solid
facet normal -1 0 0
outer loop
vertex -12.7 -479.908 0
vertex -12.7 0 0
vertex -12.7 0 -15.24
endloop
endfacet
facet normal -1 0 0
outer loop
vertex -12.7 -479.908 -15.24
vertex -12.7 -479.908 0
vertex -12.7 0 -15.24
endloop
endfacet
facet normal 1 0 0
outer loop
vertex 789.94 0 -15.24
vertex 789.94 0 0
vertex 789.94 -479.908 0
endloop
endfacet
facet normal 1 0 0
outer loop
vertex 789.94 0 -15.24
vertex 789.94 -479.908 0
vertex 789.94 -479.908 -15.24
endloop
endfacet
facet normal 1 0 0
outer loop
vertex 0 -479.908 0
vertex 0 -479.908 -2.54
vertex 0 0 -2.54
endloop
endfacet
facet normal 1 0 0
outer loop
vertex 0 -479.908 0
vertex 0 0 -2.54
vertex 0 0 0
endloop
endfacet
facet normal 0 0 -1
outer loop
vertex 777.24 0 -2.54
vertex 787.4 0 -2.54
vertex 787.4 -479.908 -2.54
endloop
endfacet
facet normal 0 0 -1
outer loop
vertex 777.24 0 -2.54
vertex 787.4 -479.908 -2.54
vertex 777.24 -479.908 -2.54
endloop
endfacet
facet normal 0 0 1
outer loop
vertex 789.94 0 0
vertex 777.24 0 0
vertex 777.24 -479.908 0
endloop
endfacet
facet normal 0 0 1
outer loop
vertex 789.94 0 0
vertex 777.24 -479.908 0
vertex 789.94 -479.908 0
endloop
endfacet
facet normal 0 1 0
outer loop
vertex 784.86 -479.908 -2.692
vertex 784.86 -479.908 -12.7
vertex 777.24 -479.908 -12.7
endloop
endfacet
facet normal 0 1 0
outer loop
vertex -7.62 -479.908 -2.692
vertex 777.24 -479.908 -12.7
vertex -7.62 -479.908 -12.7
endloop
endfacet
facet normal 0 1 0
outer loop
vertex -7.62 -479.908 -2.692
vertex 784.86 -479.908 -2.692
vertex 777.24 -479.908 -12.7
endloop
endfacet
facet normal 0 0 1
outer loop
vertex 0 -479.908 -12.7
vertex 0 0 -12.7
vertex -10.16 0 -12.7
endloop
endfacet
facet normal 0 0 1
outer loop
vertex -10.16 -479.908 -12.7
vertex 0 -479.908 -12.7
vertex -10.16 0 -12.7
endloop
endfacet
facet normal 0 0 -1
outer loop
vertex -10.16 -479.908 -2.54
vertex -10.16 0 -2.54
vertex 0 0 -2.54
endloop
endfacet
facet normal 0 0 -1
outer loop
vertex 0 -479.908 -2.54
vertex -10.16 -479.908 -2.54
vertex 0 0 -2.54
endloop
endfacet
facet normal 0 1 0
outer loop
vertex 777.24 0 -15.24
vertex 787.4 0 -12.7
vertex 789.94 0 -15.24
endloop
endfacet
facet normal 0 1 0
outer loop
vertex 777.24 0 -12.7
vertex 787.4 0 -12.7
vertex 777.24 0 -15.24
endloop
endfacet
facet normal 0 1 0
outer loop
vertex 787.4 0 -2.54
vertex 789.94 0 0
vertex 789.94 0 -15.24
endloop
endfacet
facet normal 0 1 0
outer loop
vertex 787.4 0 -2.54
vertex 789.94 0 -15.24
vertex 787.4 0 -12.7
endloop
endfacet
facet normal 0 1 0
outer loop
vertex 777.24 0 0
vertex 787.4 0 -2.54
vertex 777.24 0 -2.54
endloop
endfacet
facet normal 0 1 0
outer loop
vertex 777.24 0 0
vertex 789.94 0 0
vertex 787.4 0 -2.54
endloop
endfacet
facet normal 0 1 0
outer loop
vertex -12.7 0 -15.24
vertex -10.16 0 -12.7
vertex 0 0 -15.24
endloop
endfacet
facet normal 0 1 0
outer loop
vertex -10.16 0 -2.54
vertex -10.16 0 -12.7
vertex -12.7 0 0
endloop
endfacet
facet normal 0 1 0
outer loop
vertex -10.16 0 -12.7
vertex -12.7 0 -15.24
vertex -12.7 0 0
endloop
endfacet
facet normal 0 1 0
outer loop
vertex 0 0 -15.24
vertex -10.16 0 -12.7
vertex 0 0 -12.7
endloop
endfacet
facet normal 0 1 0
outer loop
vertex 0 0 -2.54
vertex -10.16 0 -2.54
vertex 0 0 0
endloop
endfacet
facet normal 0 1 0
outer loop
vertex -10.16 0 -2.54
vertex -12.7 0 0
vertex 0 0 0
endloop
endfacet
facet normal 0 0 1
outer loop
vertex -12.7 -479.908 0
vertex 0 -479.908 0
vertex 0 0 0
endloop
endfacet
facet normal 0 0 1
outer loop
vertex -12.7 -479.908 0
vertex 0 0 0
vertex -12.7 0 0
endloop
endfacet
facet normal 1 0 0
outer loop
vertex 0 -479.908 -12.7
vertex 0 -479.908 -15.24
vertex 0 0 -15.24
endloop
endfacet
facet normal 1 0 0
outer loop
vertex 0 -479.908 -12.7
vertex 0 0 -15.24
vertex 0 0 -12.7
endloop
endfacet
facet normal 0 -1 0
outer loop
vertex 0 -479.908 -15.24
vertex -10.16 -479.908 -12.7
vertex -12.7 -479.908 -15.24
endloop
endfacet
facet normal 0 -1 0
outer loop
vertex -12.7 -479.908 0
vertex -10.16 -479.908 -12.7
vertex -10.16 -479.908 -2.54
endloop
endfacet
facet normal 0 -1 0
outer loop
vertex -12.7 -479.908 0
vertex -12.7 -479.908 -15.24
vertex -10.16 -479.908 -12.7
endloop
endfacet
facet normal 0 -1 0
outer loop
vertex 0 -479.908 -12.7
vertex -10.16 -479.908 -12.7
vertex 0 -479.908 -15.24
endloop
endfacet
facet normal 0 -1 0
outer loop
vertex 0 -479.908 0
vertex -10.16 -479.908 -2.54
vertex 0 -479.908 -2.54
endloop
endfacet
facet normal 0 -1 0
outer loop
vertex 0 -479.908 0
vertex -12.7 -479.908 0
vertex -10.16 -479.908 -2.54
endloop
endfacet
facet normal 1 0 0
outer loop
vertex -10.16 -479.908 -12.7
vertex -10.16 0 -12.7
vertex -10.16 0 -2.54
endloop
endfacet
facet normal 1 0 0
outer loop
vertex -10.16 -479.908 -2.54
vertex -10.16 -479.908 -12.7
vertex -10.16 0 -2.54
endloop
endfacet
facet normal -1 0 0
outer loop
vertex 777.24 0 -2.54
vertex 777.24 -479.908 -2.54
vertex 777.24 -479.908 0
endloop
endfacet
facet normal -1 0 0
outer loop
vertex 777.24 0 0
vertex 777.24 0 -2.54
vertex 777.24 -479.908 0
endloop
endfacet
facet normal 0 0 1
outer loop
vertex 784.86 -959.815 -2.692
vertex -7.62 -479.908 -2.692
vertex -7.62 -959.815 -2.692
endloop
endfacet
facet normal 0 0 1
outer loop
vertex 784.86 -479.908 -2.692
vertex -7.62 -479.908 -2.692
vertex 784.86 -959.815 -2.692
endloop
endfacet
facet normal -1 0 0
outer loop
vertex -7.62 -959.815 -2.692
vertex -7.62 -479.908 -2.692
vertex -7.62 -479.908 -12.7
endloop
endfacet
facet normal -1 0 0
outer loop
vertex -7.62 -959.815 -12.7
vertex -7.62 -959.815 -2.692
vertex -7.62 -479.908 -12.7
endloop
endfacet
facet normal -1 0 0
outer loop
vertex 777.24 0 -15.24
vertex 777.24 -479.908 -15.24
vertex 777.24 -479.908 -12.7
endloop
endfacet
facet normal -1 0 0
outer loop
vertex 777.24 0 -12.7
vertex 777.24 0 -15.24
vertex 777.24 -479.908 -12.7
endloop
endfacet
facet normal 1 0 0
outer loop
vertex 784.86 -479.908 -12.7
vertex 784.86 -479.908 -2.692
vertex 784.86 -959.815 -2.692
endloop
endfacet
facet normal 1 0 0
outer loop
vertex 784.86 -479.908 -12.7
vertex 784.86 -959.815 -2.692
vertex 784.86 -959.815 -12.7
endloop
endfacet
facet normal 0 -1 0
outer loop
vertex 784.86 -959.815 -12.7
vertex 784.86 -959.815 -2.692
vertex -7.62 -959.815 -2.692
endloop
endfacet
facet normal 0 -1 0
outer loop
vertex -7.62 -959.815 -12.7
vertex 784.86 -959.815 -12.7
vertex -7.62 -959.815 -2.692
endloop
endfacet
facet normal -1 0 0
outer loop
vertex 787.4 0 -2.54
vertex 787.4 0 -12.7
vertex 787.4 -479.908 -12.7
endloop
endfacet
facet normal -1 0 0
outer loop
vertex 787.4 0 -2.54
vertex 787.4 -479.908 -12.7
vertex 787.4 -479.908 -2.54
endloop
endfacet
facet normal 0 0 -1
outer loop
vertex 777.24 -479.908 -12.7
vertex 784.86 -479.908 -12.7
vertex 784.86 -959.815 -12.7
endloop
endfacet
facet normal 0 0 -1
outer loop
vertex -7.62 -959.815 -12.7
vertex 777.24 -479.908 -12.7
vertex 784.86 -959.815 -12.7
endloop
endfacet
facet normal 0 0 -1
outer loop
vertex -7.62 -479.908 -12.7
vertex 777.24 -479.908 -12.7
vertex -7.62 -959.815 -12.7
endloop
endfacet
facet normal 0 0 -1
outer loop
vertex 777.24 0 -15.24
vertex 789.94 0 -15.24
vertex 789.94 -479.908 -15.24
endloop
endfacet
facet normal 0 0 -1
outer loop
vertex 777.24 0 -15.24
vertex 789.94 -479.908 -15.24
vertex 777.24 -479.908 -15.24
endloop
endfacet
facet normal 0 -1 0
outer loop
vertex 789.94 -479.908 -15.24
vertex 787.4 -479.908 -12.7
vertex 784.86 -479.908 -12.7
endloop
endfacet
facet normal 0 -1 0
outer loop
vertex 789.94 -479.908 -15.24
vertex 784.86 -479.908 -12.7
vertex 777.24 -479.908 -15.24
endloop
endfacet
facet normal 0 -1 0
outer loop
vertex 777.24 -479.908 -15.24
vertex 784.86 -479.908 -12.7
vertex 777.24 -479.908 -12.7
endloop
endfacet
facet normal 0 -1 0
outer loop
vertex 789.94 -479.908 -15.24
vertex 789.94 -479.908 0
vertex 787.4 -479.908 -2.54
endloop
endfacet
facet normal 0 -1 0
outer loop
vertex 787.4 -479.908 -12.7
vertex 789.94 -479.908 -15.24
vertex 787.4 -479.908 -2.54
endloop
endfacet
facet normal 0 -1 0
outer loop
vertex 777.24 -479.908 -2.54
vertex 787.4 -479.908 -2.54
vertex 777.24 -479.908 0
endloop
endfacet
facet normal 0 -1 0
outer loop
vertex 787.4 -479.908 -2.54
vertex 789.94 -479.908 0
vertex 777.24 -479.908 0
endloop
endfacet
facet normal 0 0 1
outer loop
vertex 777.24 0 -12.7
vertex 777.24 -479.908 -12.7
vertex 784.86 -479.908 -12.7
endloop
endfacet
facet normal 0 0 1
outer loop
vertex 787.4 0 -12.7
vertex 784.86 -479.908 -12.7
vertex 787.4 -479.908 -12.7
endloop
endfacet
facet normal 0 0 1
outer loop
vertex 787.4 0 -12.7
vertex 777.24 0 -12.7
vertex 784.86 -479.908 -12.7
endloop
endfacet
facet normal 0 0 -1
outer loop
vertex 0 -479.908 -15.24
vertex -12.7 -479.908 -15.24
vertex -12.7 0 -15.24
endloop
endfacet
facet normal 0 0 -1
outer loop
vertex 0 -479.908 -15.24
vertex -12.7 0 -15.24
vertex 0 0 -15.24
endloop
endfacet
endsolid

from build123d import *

# Parameters (mm, degrees)
F1_DEPTH = 479.9076
F3_DEPTH = 479.9076


with BuildPart() as f1:
    # F0 (on Front) → F1 (new body)
    with BuildSketch(Plane.XZ):
        Polygon((0, -2.54), (0, 0), (-12.7, 0), (-12.7, -15.24), (0, -15.24), (0, -12.7), (-10.16, -12.7), (-10.16, -2.54), align=None)
    extrude(amount=F1_DEPTH)


with BuildPart() as f3:
    # F2 (on face) → F3 (new body)
    with BuildSketch(Plane.XZ.offset(479.9076)):
        Polygon((388.62, -2.6924), (-7.62, -2.6924), (-7.62, -12.7), (0, -12.7), (388.62, -12.7), align=None)
    extrude(amount=F3_DEPTH)

    # F5: F3, F1 across plane


with BuildPart() as f3_1:
    add(f3.part)
    add(f3.part.mirror(Plane(origin=(388.62, -719.8614, -7.6962), x_dir=(0, 1, 0), z_dir=(1, 0, 0))))
    add(f1.part.mirror(Plane(origin=(388.62, -719.8614, -7.6962), x_dir=(0, 1, 0), z_dir=(1, 0, 0))))


solid = Compound([f1.part, f3_1.part])
